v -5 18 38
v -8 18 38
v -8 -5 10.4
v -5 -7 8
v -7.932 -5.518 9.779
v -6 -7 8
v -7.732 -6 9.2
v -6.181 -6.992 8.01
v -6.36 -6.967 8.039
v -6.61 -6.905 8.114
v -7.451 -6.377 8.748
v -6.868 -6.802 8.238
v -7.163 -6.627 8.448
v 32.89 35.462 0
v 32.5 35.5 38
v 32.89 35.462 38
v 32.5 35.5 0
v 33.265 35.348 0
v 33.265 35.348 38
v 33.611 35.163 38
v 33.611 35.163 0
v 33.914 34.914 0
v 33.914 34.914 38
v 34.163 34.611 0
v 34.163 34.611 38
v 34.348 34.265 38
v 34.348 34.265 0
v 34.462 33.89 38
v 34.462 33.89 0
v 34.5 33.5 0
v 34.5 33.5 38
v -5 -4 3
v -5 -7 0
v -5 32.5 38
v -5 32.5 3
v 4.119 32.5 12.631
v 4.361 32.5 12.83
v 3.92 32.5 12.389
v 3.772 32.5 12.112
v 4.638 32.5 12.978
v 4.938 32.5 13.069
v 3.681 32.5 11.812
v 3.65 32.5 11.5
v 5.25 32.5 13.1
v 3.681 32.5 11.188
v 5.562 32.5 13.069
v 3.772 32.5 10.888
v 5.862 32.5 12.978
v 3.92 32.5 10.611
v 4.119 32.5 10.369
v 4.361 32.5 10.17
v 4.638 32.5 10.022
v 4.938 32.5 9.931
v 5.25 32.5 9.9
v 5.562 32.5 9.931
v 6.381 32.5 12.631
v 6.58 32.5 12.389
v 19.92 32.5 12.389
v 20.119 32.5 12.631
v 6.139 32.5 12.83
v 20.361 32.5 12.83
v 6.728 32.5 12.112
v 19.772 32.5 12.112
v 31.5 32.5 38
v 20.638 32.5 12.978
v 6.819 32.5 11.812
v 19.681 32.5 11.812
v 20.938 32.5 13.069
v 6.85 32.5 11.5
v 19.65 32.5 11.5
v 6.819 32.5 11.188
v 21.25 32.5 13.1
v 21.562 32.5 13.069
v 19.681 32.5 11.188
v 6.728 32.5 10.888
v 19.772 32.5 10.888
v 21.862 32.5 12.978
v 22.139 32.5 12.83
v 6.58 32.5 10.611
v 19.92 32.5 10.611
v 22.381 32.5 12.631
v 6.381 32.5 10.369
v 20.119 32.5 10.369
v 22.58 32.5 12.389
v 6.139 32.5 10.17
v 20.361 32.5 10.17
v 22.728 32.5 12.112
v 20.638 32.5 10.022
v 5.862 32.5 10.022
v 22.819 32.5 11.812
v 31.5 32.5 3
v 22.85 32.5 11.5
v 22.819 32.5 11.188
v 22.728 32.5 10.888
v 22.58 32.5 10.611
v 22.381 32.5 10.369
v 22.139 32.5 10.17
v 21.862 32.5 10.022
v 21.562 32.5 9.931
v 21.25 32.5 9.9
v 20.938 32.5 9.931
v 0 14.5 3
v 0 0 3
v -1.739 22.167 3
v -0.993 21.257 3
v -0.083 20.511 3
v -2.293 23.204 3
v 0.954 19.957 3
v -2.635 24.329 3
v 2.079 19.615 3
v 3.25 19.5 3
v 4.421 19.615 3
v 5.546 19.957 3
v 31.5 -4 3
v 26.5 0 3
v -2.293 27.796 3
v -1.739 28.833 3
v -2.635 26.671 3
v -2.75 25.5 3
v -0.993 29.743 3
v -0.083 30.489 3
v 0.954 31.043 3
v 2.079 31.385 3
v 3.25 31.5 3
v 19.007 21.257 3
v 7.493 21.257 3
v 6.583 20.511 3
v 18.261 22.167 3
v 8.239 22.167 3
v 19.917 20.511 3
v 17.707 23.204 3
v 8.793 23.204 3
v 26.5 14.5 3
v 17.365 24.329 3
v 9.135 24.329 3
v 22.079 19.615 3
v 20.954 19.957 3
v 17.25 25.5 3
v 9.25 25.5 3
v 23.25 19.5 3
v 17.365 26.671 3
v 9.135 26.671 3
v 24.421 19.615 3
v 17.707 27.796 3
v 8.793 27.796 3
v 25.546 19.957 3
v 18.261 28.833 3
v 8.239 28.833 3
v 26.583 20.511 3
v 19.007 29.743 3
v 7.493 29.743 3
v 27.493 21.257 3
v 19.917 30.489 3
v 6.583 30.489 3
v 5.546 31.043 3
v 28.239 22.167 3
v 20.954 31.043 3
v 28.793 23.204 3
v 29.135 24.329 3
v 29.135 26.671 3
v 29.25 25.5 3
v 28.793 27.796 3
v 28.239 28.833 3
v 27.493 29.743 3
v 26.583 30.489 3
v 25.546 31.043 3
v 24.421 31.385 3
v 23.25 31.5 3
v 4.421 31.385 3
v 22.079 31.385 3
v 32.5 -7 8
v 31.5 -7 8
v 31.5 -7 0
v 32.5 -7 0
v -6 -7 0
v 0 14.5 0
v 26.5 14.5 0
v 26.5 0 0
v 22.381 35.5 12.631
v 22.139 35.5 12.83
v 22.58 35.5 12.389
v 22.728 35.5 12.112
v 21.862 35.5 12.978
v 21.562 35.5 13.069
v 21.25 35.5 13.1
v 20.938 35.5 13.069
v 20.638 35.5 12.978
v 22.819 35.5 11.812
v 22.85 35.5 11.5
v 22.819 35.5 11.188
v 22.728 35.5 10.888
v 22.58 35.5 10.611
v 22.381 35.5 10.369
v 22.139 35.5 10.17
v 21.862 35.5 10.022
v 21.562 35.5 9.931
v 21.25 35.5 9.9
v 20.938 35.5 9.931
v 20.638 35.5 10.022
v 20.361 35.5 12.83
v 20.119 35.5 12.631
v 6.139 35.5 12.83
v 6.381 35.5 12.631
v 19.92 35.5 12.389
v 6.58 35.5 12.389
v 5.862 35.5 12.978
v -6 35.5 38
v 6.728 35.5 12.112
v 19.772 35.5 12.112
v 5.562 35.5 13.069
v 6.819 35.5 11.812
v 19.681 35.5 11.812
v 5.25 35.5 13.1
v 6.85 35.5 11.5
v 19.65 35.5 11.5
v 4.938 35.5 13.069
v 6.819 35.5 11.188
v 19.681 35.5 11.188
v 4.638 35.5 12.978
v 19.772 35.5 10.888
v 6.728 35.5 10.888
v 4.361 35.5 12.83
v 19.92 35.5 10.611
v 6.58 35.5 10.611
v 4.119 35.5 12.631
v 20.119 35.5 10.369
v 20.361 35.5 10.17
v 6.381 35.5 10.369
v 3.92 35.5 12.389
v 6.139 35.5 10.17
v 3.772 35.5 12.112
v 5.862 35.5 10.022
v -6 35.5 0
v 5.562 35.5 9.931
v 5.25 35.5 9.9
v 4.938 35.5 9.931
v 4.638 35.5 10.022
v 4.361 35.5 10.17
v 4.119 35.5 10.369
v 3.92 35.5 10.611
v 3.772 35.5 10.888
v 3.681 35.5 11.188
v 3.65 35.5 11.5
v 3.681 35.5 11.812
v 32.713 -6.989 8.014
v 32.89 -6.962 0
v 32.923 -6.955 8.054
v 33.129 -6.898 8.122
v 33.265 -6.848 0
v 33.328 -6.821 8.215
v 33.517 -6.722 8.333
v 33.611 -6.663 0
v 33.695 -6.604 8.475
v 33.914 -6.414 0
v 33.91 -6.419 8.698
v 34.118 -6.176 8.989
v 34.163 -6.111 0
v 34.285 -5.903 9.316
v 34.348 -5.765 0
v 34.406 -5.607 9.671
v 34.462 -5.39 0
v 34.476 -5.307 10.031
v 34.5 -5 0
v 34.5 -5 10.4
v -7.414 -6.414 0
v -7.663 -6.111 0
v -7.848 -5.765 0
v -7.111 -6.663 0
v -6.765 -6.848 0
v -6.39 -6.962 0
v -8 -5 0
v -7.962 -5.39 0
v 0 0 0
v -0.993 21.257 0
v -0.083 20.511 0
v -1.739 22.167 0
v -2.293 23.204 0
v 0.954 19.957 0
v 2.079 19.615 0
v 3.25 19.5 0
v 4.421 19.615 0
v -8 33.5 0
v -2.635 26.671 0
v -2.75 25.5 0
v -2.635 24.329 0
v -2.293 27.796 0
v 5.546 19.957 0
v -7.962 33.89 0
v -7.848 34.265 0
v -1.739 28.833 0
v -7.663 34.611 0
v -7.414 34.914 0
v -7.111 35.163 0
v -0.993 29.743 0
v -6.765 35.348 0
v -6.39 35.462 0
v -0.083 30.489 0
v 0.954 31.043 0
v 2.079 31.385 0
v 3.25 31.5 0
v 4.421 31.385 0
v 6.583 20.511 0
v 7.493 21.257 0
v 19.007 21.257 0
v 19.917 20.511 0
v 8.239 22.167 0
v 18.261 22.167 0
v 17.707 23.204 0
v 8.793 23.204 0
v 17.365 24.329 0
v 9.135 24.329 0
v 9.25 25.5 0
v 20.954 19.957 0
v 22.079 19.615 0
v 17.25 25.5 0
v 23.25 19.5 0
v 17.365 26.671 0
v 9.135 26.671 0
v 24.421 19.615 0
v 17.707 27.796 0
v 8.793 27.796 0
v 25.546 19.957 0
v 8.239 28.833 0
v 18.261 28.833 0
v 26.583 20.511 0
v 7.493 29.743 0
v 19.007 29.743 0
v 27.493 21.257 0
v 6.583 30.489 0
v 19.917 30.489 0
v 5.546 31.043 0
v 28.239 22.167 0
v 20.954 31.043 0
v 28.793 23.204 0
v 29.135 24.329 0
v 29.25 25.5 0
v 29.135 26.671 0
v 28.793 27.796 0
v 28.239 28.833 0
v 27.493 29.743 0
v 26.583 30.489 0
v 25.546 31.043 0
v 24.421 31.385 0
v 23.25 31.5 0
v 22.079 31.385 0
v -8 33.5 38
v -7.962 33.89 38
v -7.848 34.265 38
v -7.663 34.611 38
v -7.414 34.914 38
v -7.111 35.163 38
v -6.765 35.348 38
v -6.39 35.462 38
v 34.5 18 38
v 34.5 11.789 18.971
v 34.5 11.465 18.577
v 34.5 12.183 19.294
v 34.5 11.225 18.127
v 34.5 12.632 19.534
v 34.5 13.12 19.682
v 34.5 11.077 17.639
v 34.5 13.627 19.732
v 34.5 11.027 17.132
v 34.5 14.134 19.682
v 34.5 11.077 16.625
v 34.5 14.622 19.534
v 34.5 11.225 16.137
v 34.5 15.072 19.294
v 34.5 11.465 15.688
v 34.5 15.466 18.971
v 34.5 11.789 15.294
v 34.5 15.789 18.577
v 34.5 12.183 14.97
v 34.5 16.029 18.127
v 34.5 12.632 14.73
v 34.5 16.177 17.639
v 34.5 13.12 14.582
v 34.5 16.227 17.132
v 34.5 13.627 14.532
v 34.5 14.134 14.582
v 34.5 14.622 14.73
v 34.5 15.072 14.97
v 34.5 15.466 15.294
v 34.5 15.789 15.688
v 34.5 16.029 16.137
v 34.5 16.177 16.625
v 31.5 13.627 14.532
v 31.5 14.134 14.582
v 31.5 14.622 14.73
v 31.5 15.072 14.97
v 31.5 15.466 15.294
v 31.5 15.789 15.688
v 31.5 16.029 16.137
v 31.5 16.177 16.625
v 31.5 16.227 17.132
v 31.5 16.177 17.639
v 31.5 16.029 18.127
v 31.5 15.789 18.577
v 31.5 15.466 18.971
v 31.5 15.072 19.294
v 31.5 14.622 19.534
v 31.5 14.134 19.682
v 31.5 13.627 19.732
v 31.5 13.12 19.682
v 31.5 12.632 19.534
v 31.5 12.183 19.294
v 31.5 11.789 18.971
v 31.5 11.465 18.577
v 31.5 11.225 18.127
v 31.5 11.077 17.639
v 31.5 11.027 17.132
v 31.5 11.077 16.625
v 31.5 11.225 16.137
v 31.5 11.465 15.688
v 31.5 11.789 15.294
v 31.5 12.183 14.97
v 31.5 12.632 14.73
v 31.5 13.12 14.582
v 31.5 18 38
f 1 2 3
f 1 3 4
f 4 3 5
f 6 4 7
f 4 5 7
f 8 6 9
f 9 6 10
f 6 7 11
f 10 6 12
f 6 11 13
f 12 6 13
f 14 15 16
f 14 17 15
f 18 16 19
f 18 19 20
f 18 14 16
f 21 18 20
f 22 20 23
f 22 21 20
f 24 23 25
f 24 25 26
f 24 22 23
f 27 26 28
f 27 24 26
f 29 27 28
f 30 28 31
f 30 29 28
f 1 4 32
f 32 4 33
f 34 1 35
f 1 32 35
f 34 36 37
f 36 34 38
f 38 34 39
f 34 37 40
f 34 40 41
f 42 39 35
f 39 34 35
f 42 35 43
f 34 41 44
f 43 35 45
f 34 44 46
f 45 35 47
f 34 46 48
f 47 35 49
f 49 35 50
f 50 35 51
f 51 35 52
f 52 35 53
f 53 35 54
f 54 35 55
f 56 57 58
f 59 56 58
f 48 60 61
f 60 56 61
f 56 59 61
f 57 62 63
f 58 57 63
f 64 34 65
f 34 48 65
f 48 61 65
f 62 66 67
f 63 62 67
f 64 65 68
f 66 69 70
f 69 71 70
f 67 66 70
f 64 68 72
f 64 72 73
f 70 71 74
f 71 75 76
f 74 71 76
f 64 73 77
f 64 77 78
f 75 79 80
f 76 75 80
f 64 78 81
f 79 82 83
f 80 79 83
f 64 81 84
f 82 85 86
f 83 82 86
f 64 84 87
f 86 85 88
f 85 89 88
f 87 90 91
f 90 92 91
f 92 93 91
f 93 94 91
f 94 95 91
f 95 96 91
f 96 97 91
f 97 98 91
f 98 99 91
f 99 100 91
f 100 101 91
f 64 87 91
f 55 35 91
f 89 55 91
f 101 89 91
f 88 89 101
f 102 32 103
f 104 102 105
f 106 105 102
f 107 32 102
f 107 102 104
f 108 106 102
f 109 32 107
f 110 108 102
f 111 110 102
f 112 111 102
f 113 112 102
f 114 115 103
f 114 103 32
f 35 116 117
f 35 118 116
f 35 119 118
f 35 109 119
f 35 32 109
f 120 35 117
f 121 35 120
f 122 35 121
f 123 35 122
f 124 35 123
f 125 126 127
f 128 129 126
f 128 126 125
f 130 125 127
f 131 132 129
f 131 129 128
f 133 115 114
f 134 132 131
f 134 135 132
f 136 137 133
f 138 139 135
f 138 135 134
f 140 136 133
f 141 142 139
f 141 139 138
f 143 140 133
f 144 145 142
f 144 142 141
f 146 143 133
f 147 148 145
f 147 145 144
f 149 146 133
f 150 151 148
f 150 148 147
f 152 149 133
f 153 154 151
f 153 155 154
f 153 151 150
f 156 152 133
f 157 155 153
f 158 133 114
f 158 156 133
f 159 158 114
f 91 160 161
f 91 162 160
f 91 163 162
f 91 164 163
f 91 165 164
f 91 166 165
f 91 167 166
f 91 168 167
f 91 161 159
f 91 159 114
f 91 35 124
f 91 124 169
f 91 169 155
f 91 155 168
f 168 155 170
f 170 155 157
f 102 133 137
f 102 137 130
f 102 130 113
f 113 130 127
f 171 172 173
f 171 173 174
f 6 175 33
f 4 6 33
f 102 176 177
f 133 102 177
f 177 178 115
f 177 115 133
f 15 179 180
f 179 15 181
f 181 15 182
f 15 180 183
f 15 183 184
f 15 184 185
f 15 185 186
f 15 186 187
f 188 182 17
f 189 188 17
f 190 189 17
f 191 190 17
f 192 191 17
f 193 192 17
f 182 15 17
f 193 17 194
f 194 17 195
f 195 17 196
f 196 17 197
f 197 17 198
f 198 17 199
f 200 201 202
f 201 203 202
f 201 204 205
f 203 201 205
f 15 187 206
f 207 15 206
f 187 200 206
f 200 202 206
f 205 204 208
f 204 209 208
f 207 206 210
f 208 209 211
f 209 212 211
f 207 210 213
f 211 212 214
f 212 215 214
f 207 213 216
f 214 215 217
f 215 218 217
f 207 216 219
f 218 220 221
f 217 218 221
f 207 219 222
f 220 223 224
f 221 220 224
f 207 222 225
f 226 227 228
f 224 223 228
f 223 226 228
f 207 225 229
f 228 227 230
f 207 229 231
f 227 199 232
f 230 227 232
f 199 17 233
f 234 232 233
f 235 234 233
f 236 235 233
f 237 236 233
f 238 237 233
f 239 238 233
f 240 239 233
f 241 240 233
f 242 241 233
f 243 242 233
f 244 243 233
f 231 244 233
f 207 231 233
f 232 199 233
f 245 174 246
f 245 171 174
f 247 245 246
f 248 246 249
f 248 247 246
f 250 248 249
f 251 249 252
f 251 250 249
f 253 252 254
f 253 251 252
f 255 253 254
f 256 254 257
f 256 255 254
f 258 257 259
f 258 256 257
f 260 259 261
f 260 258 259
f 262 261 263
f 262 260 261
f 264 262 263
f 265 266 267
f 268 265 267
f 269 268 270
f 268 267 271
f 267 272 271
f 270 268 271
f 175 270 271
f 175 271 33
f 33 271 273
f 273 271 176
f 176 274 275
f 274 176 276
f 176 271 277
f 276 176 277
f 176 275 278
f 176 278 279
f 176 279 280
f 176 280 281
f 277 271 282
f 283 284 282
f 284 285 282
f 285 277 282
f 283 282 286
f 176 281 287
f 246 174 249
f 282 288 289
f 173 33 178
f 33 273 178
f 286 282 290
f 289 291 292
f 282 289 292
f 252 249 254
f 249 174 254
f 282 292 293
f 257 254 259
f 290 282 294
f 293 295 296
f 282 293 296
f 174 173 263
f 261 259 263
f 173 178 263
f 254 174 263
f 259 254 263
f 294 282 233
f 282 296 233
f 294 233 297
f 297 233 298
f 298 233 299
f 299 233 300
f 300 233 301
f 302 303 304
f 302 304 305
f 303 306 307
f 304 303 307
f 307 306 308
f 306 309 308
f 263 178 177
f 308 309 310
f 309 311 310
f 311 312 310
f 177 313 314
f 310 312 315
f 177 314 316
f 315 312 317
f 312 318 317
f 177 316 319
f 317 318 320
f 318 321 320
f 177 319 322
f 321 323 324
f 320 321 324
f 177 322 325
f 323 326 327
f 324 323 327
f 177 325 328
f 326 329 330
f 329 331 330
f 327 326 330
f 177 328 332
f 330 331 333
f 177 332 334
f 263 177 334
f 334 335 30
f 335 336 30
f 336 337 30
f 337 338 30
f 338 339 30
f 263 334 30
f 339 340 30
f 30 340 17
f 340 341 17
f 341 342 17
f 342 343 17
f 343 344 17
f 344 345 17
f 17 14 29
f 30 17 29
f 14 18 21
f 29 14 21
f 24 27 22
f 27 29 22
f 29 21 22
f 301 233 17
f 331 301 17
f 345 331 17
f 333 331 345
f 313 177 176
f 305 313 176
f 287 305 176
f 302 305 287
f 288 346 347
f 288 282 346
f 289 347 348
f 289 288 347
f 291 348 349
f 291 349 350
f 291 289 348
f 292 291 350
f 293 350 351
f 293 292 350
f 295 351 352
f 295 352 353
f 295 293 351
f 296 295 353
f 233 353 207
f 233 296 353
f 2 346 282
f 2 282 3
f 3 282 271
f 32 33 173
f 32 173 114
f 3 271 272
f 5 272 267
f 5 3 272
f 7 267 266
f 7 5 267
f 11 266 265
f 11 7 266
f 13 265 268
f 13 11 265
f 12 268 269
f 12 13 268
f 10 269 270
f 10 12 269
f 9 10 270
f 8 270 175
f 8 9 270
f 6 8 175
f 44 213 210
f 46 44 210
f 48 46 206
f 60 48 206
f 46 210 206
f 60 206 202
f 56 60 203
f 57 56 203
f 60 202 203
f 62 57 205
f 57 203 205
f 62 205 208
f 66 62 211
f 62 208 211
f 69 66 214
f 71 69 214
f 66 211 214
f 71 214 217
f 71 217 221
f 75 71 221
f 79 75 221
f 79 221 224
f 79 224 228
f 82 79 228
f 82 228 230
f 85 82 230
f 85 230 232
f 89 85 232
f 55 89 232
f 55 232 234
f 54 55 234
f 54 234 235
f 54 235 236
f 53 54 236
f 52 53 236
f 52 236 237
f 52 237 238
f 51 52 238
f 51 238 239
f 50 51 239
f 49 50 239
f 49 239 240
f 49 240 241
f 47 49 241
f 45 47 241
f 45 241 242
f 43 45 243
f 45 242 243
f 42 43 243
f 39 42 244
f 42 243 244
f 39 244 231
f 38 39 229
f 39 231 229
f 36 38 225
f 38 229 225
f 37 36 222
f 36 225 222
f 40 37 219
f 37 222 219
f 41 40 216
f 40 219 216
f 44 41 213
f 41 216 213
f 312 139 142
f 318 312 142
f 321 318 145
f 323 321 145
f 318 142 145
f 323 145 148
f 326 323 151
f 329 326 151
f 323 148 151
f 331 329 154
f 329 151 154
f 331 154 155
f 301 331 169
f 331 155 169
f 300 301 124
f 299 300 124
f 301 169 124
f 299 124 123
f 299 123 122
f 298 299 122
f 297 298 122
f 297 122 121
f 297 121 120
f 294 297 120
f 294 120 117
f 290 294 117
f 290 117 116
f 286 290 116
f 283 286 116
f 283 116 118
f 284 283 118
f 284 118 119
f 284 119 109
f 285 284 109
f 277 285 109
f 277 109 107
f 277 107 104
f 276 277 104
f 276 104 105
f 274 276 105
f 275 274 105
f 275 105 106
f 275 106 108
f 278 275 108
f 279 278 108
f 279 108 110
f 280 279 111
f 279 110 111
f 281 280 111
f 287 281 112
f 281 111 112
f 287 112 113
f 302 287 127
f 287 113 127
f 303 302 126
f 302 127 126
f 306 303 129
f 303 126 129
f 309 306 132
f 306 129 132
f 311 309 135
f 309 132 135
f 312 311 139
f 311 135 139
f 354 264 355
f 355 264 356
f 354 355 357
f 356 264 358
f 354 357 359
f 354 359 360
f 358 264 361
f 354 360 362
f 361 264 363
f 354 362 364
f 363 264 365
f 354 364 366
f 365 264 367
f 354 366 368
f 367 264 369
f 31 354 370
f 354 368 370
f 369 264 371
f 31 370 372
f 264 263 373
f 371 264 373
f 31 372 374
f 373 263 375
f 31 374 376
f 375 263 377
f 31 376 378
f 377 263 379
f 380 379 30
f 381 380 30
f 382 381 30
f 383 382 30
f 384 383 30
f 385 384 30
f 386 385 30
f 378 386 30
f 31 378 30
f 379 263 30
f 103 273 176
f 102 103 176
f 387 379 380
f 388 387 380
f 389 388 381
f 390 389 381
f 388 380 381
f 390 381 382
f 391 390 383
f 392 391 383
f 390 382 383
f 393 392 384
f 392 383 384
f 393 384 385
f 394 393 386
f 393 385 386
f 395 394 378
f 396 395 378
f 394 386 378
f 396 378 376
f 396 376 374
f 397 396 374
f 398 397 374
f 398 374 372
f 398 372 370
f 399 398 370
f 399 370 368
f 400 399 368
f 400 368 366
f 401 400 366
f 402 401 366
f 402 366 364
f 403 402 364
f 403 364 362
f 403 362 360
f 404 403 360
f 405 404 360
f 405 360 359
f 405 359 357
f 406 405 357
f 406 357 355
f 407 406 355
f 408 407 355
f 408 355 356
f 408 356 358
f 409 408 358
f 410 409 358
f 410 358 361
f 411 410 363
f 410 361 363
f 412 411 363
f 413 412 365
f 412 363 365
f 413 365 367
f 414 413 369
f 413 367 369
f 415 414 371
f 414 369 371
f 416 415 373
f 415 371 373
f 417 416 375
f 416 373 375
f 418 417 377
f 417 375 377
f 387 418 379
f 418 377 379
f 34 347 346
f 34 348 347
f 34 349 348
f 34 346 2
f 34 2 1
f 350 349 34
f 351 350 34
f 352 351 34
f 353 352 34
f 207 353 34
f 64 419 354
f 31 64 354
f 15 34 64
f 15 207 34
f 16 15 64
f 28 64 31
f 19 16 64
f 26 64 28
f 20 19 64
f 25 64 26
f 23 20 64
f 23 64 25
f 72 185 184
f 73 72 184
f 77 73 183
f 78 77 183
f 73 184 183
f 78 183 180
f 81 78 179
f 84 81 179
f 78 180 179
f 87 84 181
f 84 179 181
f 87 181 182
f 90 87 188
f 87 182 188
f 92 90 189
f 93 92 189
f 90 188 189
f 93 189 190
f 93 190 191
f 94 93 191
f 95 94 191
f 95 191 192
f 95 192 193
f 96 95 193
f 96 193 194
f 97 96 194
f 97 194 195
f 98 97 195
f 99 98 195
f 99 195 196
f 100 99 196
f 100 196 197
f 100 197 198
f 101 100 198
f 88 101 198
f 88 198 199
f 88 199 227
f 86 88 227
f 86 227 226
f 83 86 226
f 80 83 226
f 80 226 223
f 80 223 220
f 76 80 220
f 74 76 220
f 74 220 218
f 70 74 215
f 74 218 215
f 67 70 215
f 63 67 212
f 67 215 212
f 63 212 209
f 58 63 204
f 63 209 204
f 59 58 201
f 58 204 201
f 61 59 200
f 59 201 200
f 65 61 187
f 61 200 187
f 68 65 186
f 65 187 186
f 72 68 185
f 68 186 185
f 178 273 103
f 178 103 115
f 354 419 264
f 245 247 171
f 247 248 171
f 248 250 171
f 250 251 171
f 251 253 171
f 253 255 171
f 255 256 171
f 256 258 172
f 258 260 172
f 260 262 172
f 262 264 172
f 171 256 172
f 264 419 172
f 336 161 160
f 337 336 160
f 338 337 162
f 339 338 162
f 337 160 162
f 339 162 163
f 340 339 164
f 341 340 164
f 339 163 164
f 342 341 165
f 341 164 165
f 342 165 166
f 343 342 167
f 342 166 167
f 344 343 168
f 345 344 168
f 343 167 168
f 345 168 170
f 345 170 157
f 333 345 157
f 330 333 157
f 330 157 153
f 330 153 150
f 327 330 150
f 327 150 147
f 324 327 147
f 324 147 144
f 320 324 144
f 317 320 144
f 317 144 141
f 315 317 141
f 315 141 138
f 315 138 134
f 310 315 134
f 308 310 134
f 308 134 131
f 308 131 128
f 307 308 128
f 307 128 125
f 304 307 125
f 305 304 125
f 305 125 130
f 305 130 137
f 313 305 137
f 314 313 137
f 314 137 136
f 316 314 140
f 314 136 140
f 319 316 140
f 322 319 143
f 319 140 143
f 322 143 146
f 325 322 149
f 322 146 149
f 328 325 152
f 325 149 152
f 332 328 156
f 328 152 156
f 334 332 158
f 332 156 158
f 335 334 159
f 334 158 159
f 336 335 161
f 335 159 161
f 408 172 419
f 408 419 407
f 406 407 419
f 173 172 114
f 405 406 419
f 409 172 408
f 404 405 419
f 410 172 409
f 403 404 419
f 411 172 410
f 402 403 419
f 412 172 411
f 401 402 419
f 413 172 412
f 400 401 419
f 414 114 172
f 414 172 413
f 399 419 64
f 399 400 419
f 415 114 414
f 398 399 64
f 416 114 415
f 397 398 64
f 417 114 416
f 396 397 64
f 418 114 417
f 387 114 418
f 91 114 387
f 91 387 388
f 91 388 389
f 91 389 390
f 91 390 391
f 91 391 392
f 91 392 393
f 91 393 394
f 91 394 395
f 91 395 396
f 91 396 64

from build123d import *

# Parameters (mm, degrees)
SKETCH_1_W          = 26.5
SKETCH_1_H          = 14.5
EXTRUDE_1_DEPTH     = 3
SKETCH_4_R          = 6
CUT_EXTRUDE_1_DEPTH = 20
SKETCH_5_W          = 36.5
SKETCH_5_H          = 36.5
EXTRUDE_3_DEPTH     = 35
CUT_EXTRUDE_3_DEPTH = 45
SKETCH_9_R          = 2.6
CUT_EXTRUDE_4_DEPTH = 26
FILLET_1_R          = 2
SKETCH_10_R         = 1.6
CUT_EXTRUDE_5_DEPTH = 9
CUT_EXTRUDE_6_DEPTH = 36.5


with BuildPart() as part:
    # 草图1 → 凸台-拉伸1 (new body)
    with BuildSketch(Plane.XY):
        Polygon((29.5, -7), (34.5, -7), (34.5, 35.5), (29.5, 35.5), (-3, 35.5), (-8, 35.5), (-8, -7), (-3, -7), align=None)
        with Locations((13.25, 7.25)):
            Rectangle(SKETCH_1_W, SKETCH_1_H, mode=Mode.SUBTRACT)
    extrude(amount=EXTRUDE_1_DEPTH)

    # 草图4 → 切除-拉伸1 (cut)
    with BuildSketch(Plane.XY.offset(3)):
        with Locations((3.25, 25.5)):
            Circle(SKETCH_4_R)
        with Locations((23.25, 25.5)):
            Circle(SKETCH_4_R)
    extrude(amount=-CUT_EXTRUDE_1_DEPTH, mode=Mode.SUBTRACT)

    # 草图5 → 凸台-拉伸3 (add)
    with BuildSketch(Plane.XY.offset(3)):
        Polygon((-8, 35.5), (-8, 32.5), (-8, -7), (34.5, -7), (34.5, 35.5), align=None)
        with Locations((13.25, 14.25)):
            Rectangle(SKETCH_5_W, SKETCH_5_H, mode=Mode.SUBTRACT)
    extrude(amount=EXTRUDE_3_DEPTH)

    # 草图8 → 切除-拉伸3 (cut)
    with BuildSketch(Plane.ZY.offset(8)):
        Polygon((38, -7), (38, 8), (38, 18), (8, -7), align=None)
    extrude(amount=-CUT_EXTRUDE_3_DEPTH, mode=Mode.SUBTRACT)

    # 草图9 → 切除-拉伸4 (cut)
    with BuildSketch(Plane(origin=(34.5, 0, 0), x_dir=(0, 0, -1), z_dir=(1, 0, 0))):
        with Locations((-17.132149333, 13.627207238)):
            Circle(SKETCH_9_R)
    extrude(amount=-CUT_EXTRUDE_4_DEPTH, mode=Mode.SUBTRACT)

    # 圆角1
    fillet_1_edges = [part.edges().sort_by_distance(p)[0] for p in [
        (-8, 35.5, 19),
        (34.5, 35.5, 19),
        (34.5, -7, 4),
        (-8, -7, 4),
    ]]
    fillet(fillet_1_edges, radius=FILLET_1_R)

    # 草图10 → 切除-拉伸5 (cut)
    with BuildSketch(Plane(origin=(0, 35.5, 0), x_dir=(1, 0, 0), z_dir=(0, 1, 0))):
        with Locations(Location((21.25, -11.5, 0), (0, 0, 270))):
            Circle(SKETCH_10_R)
        with Locations(Location((5.25, -11.5, 0), (0, 0, 270))):
            Circle(SKETCH_10_R)
    extrude(amount=-CUT_EXTRUDE_5_DEPTH, mode=Mode.SUBTRACT)

    # 草图11 → 切除-拉伸6 (cut)
    with BuildSketch(Plane(origin=(-5, 0, 0), x_dir=(0, 0, -1), z_dir=(1, 0, 0))):
        Polygon((-3, -7), (0, -7), (-3, -4), (-14.237966717, -4), (-14.237966717, -7), align=None)
    extrude(amount=CUT_EXTRUDE_6_DEPTH, mode=Mode.SUBTRACT)


solid = part.part
